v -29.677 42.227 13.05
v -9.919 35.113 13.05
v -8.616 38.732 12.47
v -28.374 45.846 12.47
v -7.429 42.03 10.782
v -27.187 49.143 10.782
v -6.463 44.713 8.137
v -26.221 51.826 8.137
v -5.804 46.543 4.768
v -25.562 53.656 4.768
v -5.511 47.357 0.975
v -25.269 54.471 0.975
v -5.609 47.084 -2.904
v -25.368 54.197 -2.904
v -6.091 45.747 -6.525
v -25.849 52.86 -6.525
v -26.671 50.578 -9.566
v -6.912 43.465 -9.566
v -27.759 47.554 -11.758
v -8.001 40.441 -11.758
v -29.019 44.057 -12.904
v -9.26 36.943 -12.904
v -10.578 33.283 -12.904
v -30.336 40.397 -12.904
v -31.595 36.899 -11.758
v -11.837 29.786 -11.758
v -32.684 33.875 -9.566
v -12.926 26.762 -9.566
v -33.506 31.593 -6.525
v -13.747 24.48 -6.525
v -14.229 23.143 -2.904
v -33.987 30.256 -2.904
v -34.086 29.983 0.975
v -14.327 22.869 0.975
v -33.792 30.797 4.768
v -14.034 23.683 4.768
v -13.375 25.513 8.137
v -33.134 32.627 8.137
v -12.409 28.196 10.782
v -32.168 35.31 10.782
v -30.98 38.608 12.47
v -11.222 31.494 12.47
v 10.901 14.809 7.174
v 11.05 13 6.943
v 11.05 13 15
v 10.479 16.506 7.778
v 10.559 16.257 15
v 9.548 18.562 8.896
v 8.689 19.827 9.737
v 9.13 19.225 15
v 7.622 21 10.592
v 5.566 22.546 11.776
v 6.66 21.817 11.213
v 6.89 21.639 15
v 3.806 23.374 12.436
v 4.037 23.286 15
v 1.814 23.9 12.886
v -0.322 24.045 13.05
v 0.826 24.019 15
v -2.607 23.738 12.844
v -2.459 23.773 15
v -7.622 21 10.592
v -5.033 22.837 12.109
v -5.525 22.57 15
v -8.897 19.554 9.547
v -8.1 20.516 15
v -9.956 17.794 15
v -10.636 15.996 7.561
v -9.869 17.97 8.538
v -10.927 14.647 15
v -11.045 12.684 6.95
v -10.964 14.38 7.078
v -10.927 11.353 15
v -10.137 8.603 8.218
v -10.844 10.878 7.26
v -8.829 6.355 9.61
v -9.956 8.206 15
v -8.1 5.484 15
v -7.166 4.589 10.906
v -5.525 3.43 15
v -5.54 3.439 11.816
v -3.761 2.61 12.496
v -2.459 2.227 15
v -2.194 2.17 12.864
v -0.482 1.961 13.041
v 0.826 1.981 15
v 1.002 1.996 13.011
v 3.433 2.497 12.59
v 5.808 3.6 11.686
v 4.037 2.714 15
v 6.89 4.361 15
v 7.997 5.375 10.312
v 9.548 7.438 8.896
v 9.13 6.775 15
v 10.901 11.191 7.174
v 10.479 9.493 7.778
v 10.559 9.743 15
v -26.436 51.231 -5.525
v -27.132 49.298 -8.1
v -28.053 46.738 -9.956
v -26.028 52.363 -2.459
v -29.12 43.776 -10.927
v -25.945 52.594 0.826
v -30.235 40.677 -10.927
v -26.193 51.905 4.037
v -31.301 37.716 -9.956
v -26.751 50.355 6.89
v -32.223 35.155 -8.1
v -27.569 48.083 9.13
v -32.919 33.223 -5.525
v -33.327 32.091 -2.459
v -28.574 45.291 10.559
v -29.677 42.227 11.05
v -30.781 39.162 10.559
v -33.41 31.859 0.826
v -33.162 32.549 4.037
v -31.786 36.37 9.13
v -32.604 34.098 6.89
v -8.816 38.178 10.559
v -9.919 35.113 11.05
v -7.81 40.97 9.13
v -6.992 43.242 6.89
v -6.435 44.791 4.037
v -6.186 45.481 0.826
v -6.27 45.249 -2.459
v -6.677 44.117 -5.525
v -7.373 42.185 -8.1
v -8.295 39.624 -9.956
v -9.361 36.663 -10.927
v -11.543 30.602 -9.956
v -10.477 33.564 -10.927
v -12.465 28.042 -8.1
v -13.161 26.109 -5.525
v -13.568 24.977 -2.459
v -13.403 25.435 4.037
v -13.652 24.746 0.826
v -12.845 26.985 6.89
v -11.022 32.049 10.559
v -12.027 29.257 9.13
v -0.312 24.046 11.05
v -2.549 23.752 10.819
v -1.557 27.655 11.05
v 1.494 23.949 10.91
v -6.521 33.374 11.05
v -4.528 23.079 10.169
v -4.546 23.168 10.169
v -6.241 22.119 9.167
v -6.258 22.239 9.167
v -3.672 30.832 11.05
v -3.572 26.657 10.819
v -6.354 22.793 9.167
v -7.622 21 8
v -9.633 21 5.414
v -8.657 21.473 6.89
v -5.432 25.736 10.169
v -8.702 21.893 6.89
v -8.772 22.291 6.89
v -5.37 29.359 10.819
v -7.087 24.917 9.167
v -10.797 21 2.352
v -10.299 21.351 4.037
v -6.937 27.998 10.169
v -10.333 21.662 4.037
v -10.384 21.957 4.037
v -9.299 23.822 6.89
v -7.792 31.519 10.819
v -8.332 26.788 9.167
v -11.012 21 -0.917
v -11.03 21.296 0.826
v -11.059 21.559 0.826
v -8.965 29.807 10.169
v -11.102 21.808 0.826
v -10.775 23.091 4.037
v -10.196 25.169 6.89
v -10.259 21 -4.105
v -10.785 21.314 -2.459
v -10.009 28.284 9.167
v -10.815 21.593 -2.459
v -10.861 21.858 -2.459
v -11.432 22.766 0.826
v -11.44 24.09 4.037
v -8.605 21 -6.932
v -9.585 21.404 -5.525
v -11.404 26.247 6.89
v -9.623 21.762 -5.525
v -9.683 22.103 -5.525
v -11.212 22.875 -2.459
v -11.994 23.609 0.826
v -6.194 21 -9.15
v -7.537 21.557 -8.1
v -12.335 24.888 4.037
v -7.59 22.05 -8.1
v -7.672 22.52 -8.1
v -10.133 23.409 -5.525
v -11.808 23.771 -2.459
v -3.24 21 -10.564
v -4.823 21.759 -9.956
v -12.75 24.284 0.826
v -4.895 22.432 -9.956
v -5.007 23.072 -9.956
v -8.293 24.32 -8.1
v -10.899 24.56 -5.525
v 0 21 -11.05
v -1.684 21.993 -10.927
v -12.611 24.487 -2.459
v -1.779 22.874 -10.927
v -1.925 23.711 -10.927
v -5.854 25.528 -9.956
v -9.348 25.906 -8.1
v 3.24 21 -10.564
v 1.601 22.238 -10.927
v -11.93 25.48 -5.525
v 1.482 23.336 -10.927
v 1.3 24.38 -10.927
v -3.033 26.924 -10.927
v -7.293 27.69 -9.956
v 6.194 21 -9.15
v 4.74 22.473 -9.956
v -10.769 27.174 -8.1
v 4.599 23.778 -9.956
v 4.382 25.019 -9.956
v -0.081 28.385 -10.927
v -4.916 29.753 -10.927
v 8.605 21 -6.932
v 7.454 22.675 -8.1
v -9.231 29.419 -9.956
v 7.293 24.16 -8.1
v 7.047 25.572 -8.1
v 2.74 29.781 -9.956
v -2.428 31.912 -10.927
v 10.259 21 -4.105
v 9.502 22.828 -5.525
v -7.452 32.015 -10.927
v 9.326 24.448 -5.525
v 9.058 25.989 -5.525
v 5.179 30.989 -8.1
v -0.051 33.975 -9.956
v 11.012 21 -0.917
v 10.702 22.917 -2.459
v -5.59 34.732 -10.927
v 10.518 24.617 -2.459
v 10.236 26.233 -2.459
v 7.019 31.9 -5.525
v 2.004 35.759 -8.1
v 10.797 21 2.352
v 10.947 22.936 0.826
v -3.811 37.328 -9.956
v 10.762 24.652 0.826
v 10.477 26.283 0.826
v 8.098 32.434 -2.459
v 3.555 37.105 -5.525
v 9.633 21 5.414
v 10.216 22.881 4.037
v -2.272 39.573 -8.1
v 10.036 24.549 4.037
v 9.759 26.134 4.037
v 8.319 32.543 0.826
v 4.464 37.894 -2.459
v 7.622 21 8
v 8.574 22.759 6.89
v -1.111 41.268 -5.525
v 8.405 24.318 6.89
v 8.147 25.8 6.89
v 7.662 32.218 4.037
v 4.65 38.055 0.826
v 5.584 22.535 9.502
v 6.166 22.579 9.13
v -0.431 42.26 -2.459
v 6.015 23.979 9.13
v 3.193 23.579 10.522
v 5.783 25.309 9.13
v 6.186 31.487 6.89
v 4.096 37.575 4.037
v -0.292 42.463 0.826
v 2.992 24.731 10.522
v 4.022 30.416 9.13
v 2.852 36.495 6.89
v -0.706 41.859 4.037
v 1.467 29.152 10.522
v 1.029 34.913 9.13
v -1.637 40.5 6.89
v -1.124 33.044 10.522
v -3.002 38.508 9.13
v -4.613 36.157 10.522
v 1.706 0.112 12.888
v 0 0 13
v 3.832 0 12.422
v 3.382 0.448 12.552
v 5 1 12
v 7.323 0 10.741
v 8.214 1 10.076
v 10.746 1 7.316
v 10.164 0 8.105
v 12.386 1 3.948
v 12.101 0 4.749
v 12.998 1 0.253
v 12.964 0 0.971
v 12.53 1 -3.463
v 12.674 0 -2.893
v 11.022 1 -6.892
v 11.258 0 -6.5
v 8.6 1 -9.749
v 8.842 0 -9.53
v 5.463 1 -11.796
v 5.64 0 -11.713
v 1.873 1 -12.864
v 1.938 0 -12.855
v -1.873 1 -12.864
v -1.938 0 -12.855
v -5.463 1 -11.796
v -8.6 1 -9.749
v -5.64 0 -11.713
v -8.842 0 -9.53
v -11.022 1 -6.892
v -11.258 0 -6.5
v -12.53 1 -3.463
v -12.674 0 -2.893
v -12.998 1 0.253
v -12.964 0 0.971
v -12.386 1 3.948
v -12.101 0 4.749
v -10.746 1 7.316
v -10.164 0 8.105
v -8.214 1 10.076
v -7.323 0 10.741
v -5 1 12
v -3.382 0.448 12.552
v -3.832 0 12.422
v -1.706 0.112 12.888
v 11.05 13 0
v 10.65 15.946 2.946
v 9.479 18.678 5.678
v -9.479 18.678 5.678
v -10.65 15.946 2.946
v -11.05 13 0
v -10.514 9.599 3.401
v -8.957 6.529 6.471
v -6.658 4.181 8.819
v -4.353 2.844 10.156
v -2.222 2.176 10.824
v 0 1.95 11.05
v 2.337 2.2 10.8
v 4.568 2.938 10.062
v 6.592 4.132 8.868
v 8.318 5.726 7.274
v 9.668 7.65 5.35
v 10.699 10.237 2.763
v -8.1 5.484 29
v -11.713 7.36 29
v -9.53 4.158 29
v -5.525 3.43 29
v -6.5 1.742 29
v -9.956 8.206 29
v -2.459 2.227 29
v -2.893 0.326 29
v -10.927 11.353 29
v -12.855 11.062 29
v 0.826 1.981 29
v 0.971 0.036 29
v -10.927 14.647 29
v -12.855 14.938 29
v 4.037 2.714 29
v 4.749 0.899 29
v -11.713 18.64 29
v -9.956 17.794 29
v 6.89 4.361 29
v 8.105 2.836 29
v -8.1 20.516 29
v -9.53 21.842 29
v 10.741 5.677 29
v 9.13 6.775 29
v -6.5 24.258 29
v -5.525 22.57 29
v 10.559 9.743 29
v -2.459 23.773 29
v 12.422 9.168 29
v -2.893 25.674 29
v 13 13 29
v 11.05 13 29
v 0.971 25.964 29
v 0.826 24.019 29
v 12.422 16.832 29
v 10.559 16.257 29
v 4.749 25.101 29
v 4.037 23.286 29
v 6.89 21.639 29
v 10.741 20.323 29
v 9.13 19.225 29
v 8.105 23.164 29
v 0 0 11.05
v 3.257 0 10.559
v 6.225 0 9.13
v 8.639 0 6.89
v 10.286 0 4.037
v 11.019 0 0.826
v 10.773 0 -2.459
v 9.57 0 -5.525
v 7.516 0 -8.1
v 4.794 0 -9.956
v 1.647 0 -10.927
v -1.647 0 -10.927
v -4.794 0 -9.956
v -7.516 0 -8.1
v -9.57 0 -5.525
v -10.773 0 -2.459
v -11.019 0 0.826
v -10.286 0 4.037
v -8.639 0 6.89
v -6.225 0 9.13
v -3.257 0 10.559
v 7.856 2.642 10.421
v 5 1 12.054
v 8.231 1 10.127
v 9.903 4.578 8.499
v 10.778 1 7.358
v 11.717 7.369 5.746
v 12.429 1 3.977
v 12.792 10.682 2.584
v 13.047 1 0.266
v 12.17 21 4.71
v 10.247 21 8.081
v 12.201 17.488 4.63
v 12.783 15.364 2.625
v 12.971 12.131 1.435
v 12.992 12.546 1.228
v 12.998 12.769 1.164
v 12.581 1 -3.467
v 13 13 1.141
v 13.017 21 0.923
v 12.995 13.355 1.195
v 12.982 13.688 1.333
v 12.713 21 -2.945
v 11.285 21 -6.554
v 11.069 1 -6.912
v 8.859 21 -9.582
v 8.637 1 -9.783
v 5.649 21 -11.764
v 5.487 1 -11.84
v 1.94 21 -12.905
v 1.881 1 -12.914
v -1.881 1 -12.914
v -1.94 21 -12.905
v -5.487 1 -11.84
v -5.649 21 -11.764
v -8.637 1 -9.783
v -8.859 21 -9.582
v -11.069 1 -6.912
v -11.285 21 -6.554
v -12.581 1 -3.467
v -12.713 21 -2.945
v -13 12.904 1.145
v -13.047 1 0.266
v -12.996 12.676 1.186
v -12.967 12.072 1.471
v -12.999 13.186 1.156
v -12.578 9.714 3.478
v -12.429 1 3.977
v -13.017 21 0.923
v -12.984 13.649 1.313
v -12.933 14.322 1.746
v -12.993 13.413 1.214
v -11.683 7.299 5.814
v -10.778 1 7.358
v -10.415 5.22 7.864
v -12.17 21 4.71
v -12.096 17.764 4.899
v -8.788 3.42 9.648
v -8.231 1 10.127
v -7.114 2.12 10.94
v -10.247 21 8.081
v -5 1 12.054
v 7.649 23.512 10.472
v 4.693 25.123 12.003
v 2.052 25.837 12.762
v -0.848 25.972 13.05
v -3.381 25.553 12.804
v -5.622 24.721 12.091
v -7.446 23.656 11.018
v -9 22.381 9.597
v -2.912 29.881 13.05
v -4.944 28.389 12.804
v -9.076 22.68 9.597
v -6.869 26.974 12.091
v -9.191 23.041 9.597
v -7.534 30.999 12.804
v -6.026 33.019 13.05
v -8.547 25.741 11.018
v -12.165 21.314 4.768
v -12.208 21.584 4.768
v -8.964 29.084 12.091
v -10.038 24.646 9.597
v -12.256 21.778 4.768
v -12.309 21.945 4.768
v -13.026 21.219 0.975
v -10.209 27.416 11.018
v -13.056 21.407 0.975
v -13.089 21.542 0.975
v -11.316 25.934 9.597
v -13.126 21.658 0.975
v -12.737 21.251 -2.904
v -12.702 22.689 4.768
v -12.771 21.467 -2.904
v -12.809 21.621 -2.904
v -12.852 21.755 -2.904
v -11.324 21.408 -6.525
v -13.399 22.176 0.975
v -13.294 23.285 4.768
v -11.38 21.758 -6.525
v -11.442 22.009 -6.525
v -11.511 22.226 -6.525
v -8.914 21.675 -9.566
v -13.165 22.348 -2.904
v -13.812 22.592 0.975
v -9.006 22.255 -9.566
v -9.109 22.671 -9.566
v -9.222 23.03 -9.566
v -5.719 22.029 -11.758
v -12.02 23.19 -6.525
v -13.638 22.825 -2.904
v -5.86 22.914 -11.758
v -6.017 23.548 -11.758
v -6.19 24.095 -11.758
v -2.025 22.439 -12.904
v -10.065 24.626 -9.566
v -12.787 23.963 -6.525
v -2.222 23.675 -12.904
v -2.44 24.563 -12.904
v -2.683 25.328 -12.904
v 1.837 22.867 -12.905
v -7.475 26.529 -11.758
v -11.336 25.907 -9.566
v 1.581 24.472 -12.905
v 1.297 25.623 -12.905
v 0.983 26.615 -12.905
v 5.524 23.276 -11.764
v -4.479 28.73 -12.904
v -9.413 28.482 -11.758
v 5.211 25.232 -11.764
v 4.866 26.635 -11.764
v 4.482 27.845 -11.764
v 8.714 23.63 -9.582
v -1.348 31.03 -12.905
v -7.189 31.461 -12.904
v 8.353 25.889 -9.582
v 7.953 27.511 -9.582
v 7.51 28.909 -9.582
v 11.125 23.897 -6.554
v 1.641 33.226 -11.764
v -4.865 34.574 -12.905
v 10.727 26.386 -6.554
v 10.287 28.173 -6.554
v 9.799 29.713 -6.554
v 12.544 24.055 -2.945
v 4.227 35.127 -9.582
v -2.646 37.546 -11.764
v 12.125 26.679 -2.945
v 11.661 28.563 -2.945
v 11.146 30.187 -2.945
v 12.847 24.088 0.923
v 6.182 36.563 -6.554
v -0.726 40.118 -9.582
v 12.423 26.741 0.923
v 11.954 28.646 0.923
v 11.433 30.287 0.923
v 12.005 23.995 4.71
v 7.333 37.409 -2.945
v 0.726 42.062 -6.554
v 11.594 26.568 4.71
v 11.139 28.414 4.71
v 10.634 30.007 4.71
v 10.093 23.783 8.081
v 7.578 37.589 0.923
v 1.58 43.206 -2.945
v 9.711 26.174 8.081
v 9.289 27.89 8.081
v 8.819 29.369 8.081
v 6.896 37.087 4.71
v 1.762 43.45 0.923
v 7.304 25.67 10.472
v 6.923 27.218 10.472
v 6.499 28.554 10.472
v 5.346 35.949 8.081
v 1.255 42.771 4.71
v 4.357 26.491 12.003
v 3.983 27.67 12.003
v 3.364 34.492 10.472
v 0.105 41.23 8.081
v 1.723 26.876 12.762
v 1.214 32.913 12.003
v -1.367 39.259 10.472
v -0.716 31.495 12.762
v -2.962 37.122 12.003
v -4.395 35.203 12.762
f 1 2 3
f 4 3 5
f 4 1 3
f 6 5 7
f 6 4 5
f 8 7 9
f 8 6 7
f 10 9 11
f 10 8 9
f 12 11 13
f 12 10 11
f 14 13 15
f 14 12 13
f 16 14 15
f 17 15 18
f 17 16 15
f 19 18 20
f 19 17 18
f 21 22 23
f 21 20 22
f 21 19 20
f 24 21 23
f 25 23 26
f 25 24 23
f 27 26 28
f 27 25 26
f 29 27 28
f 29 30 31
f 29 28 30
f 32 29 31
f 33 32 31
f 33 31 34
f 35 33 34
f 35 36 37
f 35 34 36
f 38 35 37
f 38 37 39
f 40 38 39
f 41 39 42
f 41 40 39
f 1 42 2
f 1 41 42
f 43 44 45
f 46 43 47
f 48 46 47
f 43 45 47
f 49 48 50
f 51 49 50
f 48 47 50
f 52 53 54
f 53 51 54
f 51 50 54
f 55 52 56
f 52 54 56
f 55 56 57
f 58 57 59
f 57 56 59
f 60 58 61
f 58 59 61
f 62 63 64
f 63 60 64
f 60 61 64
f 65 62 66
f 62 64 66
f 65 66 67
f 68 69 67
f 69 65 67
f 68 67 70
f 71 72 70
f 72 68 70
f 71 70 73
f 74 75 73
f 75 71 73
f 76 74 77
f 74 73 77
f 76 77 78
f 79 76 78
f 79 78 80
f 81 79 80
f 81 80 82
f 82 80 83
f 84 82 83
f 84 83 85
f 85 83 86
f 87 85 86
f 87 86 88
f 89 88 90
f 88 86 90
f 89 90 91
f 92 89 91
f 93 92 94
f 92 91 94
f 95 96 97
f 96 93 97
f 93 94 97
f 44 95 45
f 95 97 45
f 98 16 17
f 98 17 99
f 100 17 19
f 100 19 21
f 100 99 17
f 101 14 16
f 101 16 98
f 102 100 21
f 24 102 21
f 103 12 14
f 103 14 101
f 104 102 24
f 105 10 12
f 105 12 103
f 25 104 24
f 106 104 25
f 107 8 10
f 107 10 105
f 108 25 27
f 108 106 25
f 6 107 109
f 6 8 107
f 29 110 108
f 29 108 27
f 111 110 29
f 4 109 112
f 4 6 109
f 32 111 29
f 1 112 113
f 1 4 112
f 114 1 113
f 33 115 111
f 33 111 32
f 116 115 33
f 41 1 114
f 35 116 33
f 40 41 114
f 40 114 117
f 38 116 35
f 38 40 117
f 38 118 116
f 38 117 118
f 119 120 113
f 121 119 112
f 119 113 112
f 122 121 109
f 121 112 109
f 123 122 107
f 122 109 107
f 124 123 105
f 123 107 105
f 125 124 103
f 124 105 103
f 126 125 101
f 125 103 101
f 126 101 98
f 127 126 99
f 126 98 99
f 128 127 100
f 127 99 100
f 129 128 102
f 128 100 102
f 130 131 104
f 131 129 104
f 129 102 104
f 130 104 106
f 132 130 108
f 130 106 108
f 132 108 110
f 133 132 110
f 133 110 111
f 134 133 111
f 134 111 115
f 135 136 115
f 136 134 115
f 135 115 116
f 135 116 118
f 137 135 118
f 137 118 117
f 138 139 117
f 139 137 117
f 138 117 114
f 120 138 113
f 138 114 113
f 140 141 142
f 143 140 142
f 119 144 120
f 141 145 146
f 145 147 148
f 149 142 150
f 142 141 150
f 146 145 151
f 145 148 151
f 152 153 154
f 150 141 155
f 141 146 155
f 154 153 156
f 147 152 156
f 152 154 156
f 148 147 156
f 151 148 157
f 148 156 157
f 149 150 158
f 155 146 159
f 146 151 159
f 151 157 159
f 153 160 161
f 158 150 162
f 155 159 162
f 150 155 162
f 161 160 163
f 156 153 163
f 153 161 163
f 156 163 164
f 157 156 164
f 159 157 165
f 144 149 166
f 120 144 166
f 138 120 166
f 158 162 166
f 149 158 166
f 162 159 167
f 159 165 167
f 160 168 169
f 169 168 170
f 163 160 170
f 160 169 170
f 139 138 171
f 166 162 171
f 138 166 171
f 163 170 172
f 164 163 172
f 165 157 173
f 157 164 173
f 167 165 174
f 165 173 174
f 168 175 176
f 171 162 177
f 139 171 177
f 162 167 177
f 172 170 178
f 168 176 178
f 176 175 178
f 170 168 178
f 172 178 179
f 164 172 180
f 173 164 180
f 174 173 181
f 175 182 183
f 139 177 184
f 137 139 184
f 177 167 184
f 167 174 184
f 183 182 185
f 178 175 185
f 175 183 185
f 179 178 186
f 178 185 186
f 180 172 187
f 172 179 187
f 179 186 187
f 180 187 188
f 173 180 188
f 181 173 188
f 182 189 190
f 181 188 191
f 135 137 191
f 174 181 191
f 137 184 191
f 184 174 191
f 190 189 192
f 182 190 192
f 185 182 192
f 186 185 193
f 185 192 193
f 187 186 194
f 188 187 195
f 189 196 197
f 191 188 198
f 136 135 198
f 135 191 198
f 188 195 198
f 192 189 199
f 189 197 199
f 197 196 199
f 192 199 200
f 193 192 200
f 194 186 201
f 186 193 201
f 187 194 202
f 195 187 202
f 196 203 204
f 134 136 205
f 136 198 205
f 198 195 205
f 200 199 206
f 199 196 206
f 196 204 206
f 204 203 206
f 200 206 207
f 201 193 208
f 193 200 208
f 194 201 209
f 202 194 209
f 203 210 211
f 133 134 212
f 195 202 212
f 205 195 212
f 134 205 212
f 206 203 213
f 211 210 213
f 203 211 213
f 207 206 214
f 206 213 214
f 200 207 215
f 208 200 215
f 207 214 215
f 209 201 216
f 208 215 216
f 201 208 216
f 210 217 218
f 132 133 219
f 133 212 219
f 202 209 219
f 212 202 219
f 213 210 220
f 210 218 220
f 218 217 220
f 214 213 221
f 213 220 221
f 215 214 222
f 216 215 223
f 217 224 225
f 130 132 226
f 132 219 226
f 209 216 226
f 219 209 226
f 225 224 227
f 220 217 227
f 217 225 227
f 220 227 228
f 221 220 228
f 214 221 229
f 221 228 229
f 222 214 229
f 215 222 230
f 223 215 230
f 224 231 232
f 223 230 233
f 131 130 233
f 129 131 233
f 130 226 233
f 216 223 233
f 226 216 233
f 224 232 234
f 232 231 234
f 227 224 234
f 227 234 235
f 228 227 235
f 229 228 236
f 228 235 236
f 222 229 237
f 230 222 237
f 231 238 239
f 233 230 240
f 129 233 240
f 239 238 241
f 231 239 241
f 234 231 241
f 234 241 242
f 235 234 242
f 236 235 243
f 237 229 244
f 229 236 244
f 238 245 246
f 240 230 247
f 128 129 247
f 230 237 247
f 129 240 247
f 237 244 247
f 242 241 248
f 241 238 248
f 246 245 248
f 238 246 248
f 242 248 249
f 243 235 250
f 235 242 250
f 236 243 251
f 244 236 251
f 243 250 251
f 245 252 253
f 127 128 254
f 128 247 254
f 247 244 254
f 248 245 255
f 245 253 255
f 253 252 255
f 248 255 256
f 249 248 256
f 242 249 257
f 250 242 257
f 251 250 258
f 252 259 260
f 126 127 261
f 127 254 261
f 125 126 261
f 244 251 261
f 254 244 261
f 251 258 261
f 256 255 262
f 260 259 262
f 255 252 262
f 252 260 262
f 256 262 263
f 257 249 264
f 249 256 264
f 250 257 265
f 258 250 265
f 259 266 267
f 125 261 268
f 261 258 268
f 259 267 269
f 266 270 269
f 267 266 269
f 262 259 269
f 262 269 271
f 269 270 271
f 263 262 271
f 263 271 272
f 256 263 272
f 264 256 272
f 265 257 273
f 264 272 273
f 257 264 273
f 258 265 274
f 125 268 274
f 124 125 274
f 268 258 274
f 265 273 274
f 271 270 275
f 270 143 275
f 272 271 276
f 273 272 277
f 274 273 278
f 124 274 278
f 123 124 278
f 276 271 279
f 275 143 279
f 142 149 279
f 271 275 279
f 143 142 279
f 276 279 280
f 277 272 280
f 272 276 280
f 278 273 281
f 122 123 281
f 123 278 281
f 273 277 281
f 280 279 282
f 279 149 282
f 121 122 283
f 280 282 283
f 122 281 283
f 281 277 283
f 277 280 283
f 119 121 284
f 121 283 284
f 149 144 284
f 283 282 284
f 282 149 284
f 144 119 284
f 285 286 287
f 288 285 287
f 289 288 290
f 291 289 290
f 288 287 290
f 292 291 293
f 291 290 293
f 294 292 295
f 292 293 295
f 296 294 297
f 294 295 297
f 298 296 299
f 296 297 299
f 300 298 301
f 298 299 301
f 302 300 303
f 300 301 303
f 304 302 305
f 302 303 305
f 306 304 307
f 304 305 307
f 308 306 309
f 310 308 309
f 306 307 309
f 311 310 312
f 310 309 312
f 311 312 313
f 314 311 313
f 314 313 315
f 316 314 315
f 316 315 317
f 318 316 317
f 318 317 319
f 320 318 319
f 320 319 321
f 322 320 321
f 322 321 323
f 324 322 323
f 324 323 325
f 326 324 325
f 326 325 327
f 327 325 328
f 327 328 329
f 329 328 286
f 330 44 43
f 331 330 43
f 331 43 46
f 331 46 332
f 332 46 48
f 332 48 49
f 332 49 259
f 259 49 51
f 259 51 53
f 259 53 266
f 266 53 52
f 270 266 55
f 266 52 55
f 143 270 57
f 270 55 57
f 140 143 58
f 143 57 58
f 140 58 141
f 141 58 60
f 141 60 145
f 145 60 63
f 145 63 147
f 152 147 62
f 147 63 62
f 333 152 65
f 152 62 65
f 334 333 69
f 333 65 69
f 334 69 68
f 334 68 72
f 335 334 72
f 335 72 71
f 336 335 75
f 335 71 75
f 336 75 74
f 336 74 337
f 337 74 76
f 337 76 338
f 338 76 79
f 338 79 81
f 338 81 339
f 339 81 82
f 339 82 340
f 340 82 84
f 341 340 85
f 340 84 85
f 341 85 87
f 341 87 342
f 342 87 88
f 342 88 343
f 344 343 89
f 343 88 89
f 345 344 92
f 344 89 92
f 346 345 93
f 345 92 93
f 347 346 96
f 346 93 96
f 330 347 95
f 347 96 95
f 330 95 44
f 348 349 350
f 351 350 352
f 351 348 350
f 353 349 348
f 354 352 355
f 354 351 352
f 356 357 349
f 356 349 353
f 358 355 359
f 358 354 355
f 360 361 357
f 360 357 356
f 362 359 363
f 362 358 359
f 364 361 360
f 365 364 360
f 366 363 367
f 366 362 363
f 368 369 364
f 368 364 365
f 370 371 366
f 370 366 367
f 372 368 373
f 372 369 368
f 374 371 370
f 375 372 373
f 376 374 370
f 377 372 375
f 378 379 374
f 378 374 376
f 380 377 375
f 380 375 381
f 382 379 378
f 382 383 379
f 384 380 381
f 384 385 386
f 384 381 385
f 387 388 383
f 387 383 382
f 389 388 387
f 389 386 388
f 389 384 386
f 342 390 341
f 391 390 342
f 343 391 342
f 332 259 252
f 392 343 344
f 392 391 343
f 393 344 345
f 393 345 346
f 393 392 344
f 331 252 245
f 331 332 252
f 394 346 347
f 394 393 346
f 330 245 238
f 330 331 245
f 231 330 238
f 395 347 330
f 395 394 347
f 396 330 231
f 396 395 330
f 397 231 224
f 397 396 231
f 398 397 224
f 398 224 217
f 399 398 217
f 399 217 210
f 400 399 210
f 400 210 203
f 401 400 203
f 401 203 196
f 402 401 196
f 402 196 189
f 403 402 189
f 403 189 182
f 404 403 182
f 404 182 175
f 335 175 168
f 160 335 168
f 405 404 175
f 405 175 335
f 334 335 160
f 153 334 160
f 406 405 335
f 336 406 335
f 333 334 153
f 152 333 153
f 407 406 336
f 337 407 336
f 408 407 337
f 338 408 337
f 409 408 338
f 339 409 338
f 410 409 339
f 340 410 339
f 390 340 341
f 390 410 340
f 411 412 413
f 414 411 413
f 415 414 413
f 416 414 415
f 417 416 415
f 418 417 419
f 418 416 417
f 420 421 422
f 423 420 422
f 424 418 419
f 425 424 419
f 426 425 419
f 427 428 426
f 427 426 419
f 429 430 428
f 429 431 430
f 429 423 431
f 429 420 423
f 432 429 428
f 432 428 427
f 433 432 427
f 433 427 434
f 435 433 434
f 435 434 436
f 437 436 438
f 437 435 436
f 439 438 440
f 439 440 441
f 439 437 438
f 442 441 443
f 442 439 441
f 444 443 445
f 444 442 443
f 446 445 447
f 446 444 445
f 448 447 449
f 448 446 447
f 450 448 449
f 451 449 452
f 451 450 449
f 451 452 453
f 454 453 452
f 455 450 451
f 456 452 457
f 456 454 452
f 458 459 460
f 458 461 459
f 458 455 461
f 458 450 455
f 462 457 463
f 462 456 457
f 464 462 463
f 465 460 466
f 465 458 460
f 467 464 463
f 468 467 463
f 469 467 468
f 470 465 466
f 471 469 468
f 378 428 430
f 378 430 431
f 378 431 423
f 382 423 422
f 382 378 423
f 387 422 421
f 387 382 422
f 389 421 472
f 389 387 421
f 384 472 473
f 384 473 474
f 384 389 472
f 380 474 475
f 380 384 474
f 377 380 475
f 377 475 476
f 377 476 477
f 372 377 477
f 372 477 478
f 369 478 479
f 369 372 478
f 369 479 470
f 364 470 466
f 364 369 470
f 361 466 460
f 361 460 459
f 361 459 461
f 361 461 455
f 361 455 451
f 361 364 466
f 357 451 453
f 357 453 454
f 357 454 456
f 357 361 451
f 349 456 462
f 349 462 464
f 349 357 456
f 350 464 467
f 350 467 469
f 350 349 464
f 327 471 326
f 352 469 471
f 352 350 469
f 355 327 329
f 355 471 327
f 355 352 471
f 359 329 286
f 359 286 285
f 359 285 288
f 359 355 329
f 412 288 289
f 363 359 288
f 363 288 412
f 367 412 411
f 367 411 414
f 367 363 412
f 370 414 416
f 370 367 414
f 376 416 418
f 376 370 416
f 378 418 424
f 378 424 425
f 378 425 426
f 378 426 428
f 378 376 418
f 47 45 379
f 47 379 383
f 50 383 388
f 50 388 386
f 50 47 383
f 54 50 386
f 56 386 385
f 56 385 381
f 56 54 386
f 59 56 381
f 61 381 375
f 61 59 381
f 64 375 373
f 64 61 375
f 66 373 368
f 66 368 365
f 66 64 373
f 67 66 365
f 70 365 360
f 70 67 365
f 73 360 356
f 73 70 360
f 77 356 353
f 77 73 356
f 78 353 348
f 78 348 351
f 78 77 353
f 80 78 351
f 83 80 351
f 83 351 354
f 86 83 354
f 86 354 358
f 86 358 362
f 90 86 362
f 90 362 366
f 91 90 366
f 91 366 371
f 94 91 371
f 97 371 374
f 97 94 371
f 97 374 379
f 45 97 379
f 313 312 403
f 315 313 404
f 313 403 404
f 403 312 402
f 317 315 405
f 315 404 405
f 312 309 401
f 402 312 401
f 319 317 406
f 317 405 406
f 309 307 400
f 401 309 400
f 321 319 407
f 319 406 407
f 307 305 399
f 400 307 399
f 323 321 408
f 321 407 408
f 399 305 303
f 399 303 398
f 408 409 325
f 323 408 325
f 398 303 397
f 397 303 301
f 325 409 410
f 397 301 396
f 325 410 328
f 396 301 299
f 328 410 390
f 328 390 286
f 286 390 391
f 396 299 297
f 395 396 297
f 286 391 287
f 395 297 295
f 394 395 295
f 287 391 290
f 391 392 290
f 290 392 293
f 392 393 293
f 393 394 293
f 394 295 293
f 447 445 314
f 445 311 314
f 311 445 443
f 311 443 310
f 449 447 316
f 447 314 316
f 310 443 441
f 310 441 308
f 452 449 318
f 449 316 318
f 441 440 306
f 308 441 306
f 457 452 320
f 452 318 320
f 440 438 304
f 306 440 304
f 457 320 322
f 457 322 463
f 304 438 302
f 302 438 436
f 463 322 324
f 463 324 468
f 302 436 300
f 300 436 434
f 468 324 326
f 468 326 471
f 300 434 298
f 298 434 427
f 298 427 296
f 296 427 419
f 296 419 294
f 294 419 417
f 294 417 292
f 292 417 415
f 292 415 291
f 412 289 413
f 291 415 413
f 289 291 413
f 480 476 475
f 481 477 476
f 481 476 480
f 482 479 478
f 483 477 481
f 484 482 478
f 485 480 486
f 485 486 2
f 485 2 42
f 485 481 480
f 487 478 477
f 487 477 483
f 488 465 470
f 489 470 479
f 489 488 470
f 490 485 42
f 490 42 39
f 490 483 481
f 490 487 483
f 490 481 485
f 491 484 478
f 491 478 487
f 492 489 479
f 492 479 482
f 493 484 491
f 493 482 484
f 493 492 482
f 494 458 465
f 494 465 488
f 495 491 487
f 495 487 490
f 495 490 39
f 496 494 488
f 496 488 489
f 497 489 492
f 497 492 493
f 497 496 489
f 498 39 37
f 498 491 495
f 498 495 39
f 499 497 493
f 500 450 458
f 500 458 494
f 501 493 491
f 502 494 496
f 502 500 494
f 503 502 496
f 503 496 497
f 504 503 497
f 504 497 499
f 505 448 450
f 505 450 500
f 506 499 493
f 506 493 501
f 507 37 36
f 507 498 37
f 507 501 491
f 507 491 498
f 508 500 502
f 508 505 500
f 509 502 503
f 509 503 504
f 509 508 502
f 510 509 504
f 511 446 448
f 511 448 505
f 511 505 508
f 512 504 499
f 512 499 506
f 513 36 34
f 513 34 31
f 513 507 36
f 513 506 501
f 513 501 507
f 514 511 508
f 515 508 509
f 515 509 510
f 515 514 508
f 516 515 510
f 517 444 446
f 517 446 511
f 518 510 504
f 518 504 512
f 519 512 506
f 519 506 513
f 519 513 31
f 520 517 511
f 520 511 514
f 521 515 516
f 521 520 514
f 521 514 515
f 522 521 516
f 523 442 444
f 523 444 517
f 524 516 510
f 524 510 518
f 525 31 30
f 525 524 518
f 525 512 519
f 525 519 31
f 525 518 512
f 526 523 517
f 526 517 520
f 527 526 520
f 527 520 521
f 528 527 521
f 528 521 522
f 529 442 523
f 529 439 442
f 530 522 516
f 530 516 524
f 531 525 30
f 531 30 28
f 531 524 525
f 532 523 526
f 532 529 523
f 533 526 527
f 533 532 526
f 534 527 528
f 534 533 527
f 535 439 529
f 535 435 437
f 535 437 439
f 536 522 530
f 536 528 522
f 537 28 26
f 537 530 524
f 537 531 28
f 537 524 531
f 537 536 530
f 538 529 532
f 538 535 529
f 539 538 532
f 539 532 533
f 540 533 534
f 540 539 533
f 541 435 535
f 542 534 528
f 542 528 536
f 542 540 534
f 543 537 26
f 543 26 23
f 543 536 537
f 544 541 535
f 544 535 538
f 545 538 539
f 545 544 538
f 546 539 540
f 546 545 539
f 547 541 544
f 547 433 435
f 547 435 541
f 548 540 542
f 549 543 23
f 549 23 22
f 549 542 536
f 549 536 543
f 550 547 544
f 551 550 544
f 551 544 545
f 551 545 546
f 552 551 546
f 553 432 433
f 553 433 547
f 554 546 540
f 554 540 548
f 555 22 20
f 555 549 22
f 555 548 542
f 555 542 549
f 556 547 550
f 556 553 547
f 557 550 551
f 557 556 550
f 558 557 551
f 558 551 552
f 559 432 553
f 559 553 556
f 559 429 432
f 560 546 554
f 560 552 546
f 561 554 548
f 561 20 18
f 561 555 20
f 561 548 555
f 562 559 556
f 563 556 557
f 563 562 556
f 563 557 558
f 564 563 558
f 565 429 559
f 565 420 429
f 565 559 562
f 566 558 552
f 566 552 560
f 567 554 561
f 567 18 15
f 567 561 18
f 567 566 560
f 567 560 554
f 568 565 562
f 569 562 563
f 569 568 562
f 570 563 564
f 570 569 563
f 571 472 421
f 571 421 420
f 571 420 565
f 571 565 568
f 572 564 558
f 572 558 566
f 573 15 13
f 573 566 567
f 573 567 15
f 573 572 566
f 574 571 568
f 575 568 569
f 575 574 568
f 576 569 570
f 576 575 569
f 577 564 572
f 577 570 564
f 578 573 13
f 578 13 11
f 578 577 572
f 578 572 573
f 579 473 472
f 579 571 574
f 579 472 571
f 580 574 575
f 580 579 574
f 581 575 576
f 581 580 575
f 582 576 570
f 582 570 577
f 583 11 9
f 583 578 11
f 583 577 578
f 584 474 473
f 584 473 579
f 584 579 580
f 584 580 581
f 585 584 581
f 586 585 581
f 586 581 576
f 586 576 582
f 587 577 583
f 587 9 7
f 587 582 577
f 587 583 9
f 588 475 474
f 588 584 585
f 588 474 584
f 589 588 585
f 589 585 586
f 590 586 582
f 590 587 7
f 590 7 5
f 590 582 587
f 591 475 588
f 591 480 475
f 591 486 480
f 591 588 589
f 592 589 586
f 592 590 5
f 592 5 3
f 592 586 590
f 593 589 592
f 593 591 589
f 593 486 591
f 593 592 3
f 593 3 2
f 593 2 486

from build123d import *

# Parameters (mm, degrees)
CROQUIS1_R                          = 13
CROQUIS1_R_2                        = 11.05
SALIENTE_EXTRUIR1_DEPTH             = 1
BARRER_L_MINA1_PROFILE_R            = 13.05
BARRER_L_MINA1_PROFILE_R_2          = 11.05
CROQUIS19_R                         = 13
CROQUIS19_R_2                       = 11.05
SALIENTE_EXTRUIR2_DEPTH             = 14
SALIENTE_EXTRUIR2_DIRECTION_2_REACH = 72.145
CORTAR_EXTRUIR1_REACH               = 78.822
CROQUIS20_R                         = 11.05


with BuildPart() as part:
    # Croquis1 → Saliente-Extruir1 (new body)
    with BuildSketch(Plane(origin=(0, 0, 0), x_dir=(1, 0, 0), z_dir=(0, 1, 0))):
        with Locations(Location((0, 0, 0), (0, 0, 270))):
            Circle(CROQUIS1_R)
        with Locations(Location((0, 0, 0), (0, 0, 270))):
            Circle(CROQUIS1_R_2, mode=Mode.SUBTRACT)
    extrude(amount=SALIENTE_EXTRUIR1_DEPTH)

    # Barrer-L_mina1: sweep along a path in Croquis2
    with BuildLine(Plane.XY) as barrer_l_mina1_path:
        Line((0, 1), (0, 21))
        ThreePointArc((0, 21), (-2.727754239, 29.625078781), (-9.918931196, 35.113211534))
        Line((-9.918931196, 35.113211534), (-29.677427344, 42.226707859))
    # Barrer-L_mina1 profile (on start of the path) → Barrer-L_mina1 (sweep)
    with BuildSketch(Plane.ZX.offset(1)):
        Circle(BARRER_L_MINA1_PROFILE_R)
        Circle(BARRER_L_MINA1_PROFILE_R_2, mode=Mode.SUBTRACT)
    sweep(path=barrer_l_mina1_path.line)

    # Croquis19 → Saliente-Extruir2 (add)
    with BuildSketch(Plane.XY.offset(15)):
        with Locations((0, 13)):
            Circle(CROQUIS19_R)
        with Locations((0, 13)):
            Circle(CROQUIS19_R_2, mode=Mode.SUBTRACT)
    extrude(amount=SALIENTE_EXTRUIR2_DEPTH)

    # Croquis19 → Saliente-Extruir2 direction 2 (add, up to next)
    with BuildSketch(Plane.XY.offset(15), mode=Mode.PRIVATE) as saliente_extruir2_direction_2_sk1:
        with Locations((0, 13)):
            Circle(CROQUIS19_R)
        with Locations((0, 13)):
            Circle(CROQUIS19_R_2, mode=Mode.SUBTRACT)
    saliente_extruir2_direction_2_tool1 = extrude(saliente_extruir2_direction_2_sk1.sketch, amount=-SALIENTE_EXTRUIR2_DIRECTION_2_REACH, mode=Mode.PRIVATE) - part.part
    add(saliente_extruir2_direction_2_tool1.solids().sort_by_distance((-12.632304, 13, 15))[0])

    # Croquis20 → Cortar-Extruir1 (cut, up to next)
    with BuildSketch(Plane.XY.offset(29), mode=Mode.PRIVATE) as cortar_extruir1_sk1:
        with Locations((0, 13)):
            Circle(CROQUIS20_R)
    cortar_extruir1_tool1 = extrude(cortar_extruir1_sk1.sketch, amount=-CORTAR_EXTRUIR1_REACH, mode=Mode.PRIVATE) & part.part
    add(cortar_extruir1_tool1.solids().sort_by_distance((0, 13, 29))[0], mode=Mode.SUBTRACT)


solid = part.part
